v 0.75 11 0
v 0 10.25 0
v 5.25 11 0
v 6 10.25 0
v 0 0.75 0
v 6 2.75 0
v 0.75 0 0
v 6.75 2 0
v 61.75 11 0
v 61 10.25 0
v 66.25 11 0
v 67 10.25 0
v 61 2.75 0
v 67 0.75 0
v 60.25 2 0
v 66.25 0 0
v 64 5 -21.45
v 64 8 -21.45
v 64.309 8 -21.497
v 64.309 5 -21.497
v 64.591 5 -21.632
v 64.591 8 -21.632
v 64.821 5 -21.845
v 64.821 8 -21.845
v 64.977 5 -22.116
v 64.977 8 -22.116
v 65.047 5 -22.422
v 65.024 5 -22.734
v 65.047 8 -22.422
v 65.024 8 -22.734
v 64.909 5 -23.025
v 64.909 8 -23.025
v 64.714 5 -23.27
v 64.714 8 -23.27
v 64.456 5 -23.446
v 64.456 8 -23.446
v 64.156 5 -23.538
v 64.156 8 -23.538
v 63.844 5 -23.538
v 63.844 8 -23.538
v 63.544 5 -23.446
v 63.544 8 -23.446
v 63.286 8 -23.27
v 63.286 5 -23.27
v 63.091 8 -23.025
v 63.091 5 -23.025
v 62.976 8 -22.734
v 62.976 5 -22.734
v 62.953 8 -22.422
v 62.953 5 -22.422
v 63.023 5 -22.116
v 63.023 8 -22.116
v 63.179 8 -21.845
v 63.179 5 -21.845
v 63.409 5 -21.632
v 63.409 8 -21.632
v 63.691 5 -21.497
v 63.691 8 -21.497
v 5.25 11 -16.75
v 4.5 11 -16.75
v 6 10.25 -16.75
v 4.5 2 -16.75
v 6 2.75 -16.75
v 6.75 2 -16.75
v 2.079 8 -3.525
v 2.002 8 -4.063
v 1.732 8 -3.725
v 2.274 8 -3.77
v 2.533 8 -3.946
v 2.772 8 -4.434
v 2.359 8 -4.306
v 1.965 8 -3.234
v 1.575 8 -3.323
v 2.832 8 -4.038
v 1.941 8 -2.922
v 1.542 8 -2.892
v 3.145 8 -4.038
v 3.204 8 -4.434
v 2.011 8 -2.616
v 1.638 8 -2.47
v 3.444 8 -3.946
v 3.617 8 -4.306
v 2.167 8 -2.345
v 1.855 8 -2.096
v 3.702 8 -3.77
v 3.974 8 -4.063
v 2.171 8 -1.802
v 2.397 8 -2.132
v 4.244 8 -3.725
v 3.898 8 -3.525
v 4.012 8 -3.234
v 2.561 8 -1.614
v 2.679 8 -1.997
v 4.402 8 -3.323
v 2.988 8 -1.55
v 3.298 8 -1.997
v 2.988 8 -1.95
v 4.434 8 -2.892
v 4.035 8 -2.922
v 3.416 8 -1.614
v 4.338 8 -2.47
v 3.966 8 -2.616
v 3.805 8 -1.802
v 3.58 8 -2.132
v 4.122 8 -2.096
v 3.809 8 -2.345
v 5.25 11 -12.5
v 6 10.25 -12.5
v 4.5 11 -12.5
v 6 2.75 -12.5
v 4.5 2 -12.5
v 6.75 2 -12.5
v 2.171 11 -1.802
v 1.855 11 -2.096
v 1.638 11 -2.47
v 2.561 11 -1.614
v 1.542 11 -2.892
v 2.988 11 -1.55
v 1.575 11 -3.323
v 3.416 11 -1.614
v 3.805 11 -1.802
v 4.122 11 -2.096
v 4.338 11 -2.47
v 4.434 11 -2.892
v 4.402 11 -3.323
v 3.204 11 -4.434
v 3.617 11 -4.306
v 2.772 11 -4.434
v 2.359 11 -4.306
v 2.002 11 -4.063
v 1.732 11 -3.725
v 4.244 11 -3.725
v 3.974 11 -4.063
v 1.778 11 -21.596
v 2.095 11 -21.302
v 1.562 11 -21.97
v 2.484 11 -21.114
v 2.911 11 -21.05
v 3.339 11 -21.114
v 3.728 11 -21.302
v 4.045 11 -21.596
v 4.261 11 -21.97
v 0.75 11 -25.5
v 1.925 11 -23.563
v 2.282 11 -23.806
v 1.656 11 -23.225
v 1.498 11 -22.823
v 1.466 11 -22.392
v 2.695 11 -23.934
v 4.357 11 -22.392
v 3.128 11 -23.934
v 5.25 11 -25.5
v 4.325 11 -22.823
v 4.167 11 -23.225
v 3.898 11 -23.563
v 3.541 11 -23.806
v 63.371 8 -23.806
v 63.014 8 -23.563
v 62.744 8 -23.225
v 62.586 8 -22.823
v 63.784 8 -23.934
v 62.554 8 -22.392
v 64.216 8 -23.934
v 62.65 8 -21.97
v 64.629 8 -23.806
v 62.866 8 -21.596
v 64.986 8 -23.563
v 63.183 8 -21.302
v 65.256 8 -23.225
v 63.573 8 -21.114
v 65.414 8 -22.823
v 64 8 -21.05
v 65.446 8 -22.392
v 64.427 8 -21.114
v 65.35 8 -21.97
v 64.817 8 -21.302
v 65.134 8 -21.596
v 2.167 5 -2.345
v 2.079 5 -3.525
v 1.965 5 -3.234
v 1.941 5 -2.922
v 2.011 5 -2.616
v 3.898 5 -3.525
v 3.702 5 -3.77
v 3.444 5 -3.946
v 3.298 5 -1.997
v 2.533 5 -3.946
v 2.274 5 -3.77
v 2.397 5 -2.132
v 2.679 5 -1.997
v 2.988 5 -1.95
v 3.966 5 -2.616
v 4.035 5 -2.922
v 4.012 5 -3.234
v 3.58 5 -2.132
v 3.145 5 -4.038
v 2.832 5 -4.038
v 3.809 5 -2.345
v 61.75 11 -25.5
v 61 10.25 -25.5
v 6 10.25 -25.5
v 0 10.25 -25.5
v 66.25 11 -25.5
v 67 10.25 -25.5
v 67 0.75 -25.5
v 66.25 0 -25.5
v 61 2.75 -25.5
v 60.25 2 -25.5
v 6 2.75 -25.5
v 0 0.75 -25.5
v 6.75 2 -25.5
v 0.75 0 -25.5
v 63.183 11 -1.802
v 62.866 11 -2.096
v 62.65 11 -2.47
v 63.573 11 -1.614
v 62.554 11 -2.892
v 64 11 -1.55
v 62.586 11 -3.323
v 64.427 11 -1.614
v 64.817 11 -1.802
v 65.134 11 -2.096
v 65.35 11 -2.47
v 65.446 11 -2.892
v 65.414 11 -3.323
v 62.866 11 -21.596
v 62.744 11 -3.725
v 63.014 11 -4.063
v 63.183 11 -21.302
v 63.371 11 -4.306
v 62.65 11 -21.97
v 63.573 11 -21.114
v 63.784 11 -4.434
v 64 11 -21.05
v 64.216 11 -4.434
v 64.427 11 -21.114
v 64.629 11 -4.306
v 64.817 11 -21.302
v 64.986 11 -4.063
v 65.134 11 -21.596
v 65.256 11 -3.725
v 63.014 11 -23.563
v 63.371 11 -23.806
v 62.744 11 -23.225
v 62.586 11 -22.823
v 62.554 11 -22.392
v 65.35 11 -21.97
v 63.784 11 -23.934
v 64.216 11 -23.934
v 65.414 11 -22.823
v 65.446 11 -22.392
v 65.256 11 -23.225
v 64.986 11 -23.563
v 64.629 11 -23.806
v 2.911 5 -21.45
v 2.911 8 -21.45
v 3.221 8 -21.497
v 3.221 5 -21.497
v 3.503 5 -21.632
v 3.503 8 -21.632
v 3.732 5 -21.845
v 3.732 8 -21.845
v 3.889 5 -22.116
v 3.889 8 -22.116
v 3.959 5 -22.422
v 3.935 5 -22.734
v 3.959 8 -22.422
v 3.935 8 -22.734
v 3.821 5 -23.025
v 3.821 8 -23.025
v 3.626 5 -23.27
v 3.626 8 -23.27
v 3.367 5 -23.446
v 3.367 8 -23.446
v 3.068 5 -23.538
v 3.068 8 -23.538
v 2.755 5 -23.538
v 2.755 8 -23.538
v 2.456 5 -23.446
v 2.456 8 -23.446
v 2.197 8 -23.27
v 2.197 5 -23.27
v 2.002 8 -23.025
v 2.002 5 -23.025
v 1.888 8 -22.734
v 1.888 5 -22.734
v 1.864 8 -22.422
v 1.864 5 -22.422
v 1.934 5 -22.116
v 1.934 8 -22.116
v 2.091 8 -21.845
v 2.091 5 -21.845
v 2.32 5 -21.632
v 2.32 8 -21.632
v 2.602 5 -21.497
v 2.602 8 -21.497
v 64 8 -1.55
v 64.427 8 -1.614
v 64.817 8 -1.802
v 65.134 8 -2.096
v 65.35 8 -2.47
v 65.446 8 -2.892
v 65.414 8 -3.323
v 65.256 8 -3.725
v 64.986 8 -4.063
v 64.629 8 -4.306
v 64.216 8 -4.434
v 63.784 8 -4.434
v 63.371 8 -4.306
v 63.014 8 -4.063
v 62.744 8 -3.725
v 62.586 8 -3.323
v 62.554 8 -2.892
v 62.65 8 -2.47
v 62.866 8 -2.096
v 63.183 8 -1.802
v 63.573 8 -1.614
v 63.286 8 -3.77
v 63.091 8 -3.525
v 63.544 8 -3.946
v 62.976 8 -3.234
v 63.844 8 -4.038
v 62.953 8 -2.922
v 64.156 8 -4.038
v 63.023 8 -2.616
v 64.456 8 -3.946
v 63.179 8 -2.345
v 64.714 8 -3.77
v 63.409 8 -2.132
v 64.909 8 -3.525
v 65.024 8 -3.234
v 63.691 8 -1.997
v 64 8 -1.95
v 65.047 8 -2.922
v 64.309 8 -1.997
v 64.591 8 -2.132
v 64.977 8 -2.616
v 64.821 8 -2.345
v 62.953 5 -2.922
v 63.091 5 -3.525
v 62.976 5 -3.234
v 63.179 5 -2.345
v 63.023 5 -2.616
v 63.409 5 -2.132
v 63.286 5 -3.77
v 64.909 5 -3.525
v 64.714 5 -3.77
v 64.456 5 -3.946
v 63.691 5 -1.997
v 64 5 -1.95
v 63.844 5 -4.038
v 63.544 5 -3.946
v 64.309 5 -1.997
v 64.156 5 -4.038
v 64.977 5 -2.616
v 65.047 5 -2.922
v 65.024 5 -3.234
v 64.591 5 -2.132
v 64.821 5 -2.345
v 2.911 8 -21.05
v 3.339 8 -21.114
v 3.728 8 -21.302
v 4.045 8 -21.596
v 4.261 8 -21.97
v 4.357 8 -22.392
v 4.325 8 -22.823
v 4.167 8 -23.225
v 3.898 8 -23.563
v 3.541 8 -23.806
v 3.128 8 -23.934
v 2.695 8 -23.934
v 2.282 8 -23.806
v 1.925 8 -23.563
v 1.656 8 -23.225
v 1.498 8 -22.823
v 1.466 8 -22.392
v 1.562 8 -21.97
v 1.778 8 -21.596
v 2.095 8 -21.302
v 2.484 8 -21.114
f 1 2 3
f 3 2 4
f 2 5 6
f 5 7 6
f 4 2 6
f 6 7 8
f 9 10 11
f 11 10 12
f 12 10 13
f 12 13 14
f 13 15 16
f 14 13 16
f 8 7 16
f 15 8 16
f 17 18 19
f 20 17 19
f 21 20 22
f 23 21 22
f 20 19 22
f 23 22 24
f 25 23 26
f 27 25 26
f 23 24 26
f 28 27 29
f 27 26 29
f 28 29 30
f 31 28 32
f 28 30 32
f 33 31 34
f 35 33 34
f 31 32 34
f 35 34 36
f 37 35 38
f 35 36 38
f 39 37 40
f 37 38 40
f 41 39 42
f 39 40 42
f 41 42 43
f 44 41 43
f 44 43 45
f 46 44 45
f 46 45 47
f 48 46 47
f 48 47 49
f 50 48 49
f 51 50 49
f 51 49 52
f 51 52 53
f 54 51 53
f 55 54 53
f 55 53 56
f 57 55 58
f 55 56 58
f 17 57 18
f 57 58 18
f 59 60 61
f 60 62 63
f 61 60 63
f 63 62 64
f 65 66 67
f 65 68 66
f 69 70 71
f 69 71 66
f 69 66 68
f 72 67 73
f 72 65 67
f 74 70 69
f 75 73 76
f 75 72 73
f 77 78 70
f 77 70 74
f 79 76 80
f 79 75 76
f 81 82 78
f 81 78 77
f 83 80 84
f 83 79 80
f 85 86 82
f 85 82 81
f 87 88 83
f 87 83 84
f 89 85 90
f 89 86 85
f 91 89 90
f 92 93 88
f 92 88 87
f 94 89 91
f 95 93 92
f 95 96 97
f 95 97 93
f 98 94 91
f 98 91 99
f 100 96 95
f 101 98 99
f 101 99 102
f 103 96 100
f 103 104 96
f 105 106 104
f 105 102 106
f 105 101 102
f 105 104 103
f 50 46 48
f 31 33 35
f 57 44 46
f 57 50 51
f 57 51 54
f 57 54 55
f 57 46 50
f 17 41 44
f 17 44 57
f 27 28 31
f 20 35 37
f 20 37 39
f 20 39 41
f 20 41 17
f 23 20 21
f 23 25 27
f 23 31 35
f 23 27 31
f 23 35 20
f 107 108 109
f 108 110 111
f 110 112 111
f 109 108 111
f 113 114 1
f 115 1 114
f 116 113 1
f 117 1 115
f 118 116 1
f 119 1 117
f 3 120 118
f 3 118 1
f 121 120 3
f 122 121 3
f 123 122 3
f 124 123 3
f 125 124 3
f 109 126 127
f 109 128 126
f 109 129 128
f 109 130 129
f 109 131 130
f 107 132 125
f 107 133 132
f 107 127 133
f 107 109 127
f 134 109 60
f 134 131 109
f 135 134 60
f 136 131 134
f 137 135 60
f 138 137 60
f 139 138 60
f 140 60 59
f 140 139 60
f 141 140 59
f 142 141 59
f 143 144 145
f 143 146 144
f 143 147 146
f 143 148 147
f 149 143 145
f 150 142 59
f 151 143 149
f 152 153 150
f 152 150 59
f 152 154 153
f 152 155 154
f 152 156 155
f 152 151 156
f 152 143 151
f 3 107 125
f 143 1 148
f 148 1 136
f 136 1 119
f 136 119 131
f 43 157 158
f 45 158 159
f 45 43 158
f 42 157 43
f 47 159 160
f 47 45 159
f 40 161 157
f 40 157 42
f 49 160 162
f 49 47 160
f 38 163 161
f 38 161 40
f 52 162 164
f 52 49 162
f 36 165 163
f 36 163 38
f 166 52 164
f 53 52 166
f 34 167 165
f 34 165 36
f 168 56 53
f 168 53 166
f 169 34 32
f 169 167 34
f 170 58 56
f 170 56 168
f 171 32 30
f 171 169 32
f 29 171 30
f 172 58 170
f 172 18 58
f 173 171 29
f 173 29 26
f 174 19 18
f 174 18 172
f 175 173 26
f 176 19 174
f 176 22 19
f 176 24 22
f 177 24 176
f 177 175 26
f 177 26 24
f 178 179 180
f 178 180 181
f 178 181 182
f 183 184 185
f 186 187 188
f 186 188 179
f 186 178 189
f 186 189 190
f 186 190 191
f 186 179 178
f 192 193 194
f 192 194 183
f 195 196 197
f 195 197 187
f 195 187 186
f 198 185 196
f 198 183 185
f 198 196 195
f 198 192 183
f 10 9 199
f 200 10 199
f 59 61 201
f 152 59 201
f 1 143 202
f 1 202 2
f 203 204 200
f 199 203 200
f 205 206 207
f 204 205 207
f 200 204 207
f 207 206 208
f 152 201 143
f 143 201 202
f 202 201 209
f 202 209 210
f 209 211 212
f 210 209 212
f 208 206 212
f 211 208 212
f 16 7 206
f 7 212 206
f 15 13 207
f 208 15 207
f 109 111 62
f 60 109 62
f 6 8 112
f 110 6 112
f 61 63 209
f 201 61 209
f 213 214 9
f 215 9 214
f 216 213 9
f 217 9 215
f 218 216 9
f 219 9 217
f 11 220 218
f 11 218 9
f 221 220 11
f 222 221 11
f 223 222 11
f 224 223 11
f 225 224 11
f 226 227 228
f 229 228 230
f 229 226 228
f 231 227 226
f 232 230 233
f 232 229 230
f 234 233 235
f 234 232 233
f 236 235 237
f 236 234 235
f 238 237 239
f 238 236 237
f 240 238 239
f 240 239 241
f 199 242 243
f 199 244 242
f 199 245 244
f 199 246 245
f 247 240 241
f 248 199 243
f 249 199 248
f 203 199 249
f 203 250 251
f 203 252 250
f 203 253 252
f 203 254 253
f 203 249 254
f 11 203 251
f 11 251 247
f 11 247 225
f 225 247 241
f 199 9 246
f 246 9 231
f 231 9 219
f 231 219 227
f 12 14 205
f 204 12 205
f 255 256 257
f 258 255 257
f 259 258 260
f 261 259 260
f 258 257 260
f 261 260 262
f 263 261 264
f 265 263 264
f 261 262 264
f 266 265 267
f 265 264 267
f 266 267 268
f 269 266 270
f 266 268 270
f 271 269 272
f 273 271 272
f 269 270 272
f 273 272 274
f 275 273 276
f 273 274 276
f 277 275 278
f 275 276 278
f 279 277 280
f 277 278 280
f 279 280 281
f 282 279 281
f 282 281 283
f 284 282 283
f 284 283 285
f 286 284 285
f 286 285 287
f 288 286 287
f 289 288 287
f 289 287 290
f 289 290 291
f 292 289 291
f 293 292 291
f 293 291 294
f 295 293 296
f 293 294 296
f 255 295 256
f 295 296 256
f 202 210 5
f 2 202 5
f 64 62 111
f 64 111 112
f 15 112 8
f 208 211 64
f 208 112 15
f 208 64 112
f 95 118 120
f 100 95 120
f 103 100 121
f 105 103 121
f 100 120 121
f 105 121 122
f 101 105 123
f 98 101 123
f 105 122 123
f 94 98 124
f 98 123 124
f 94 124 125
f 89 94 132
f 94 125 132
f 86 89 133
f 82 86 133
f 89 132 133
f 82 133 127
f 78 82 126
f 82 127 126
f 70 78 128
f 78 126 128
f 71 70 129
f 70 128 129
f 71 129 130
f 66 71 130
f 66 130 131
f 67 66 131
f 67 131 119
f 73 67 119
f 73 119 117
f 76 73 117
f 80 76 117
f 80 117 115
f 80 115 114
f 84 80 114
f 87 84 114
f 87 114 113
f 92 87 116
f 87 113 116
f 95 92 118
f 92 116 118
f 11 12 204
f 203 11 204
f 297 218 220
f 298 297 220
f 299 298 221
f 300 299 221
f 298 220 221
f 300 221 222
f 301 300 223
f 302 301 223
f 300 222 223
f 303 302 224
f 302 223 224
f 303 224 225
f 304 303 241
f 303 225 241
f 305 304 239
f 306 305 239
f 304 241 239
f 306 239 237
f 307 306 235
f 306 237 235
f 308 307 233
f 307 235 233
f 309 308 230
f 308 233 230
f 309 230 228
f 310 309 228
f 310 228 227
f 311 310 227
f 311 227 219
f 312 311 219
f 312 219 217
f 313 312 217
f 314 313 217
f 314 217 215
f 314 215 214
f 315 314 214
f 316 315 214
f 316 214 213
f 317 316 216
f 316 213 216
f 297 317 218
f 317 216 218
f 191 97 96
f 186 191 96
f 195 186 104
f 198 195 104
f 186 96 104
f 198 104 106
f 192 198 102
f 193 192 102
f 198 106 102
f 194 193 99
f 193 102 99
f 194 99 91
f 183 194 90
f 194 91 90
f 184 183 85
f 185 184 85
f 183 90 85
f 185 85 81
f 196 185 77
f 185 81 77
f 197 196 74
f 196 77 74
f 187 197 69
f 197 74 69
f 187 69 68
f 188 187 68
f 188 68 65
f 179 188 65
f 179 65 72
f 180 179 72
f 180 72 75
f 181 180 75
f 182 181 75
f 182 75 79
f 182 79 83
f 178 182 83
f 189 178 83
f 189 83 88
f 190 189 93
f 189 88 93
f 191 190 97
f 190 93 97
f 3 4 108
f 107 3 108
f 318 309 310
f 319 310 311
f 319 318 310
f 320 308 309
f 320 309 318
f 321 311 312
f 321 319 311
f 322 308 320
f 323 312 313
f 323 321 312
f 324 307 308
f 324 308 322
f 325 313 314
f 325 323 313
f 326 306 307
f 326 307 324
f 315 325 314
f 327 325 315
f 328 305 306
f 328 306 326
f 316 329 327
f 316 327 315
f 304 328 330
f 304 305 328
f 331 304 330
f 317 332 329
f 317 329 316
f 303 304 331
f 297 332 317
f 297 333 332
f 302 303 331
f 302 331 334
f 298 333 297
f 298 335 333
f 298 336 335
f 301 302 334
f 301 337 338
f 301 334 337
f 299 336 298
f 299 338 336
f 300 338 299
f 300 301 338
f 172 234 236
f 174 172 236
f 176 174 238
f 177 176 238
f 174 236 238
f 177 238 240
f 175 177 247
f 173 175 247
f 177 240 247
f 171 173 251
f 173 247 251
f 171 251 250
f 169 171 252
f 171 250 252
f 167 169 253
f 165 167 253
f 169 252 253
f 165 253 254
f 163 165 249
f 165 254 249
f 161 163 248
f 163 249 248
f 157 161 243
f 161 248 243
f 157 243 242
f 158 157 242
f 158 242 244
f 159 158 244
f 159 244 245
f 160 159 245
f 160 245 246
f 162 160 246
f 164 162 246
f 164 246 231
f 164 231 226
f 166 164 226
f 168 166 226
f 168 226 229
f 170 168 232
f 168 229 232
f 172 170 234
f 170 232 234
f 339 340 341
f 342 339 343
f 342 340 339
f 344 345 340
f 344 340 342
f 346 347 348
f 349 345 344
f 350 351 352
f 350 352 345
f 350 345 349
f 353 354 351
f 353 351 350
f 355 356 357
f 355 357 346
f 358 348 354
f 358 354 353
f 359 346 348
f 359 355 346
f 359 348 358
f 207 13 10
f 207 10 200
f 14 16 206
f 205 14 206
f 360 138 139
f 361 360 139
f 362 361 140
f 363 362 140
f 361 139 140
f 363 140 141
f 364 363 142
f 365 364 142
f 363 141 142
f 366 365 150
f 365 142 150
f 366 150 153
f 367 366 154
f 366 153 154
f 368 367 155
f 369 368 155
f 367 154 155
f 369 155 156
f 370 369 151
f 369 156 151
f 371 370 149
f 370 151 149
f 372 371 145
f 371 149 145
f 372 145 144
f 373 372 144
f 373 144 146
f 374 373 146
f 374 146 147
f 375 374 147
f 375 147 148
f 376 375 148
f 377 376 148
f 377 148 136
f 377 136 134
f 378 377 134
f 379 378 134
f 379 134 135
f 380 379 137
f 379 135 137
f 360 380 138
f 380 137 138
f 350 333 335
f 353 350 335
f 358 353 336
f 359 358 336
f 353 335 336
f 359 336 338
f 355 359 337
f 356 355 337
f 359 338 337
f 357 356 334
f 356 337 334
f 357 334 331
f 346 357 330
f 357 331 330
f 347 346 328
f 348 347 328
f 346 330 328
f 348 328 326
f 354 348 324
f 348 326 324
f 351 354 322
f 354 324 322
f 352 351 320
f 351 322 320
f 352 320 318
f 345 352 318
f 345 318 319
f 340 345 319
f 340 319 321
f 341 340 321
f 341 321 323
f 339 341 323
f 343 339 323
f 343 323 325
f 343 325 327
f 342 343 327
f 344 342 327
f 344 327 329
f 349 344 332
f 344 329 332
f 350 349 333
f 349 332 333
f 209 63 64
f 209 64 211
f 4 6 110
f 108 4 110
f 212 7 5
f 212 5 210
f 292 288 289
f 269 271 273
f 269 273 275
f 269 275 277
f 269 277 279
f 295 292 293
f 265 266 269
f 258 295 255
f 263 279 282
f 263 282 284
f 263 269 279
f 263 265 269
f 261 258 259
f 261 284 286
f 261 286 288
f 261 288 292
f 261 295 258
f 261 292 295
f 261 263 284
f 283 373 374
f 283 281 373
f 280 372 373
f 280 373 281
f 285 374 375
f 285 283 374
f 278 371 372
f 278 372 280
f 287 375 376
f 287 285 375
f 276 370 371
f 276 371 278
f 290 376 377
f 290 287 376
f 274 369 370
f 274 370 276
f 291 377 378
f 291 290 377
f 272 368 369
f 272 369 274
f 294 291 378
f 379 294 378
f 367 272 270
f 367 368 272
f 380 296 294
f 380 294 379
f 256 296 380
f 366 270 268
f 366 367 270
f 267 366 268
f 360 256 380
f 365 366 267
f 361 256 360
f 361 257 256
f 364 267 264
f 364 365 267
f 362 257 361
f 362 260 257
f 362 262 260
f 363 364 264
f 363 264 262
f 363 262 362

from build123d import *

# Parameters (mm, degrees)
SKETCH1_W           = 67
SKETCH1_H           = 25.5
BOSS_EXTRUDE1_DEPTH = 2
SKETCH3_W           = 6
SKETCH3_H           = 25.5
BOSS_EXTRUDE2_DEPTH = 9
BOSS_EXTRUDE3_DEPTH = 9
SKETCH6_R           = 1.45
CUT_EXTRUDE1_DEPTH  = 3
CHAMFER1_SIZE       = 0.75
SKETCH7_R           = 1.05
CUT_EXTRUDE2_DEPTH  = 3


with BuildPart() as part:
    # Sketch1 → Boss-Extrude1 (new body)
    with BuildSketch(Plane(origin=(0, 0, 0), x_dir=(1, 0, 0), z_dir=(0, 1, 0))):
        with Locations((33.5, 12.75)):
            Rectangle(SKETCH1_W, SKETCH1_H)
    extrude(amount=BOSS_EXTRUDE1_DEPTH)

    # Sketch3 → Boss-Extrude2 (add)
    with BuildSketch(Plane(origin=(0, 2, 0), x_dir=(1, 0, 0), z_dir=(0, 1, 0))):
        with Locations((64, 12.75)):
            Rectangle(SKETCH3_W, SKETCH3_H)
    extrude(amount=BOSS_EXTRUDE2_DEPTH)

    # Sketch4 → Boss-Extrude3 (add)
    with BuildSketch(Plane(origin=(0, 2, 0), x_dir=(1, 0, 0), z_dir=(0, 1, 0))):
        Polygon((0, 0), (6, 0), (6, 12.5), (4.5, 12.5), (4.5, 16.75), (6, 16.75), (6, 25.5), (0, 25.5), align=None)
    extrude(amount=BOSS_EXTRUDE3_DEPTH)

    # Sketch6 → Cut-Extrude1 (cut)
    with BuildSketch(Plane(origin=(0, 11, 0), x_dir=(1, 0, 0), z_dir=(0, 1, 0))):
        with Locations(Location((2.911463201, 22.5, 0), (0, 0, 270))):
            Circle(SKETCH6_R)
        with Locations(Location((2.988195093, 3, 0), (0, 0, 270))):
            Circle(SKETCH6_R)
        with Locations(Location((64, 22.5, 0), (0, 0, 270))):
            Circle(SKETCH6_R)
        with Locations(Location((64, 3, 0), (0, 0, 270))):
            Circle(SKETCH6_R)
    extrude(amount=-CUT_EXTRUDE1_DEPTH, mode=Mode.SUBTRACT)

    # Chamfer1
    chamfer1_edges = [part.edges().sort_by_distance(p)[0] for p in [
        (61, 2, -12.75),
        (67, 11, -12.75),
        (61, 11, -12.75),
        (6, 2, -6.25),
        (6, 2, -21.125),
        (0, 11, -12.75),
        (6, 11, -6.25),
        (6, 11, -21.125),
        (67, 0, -12.75),
        (0, 0, -12.75),
    ]]
    chamfer(chamfer1_edges, length=CHAMFER1_SIZE)

    # Sketch7 → Cut-Extrude2 (cut)
    with BuildSketch(Plane(origin=(0, 8, 0), x_dir=(1, 0, 0), z_dir=(0, 1, 0))):
        with Locations(Location((2.911463201, 22.5, 0), (0, 0, 270))):
            Circle(SKETCH7_R)
        with Locations(Location((2.988195093, 3, 0), (0, 0, 270))):
            Circle(SKETCH7_R)
        with Locations(Location((64, 3, 0), (0, 0, 270))):
            Circle(SKETCH7_R)
        with Locations(Location((64, 22.5, 0), (0, 0, 270))):
            Circle(SKETCH7_R)
    extrude(amount=-CUT_EXTRUDE2_DEPTH, mode=Mode.SUBTRACT)


solid = part.part
